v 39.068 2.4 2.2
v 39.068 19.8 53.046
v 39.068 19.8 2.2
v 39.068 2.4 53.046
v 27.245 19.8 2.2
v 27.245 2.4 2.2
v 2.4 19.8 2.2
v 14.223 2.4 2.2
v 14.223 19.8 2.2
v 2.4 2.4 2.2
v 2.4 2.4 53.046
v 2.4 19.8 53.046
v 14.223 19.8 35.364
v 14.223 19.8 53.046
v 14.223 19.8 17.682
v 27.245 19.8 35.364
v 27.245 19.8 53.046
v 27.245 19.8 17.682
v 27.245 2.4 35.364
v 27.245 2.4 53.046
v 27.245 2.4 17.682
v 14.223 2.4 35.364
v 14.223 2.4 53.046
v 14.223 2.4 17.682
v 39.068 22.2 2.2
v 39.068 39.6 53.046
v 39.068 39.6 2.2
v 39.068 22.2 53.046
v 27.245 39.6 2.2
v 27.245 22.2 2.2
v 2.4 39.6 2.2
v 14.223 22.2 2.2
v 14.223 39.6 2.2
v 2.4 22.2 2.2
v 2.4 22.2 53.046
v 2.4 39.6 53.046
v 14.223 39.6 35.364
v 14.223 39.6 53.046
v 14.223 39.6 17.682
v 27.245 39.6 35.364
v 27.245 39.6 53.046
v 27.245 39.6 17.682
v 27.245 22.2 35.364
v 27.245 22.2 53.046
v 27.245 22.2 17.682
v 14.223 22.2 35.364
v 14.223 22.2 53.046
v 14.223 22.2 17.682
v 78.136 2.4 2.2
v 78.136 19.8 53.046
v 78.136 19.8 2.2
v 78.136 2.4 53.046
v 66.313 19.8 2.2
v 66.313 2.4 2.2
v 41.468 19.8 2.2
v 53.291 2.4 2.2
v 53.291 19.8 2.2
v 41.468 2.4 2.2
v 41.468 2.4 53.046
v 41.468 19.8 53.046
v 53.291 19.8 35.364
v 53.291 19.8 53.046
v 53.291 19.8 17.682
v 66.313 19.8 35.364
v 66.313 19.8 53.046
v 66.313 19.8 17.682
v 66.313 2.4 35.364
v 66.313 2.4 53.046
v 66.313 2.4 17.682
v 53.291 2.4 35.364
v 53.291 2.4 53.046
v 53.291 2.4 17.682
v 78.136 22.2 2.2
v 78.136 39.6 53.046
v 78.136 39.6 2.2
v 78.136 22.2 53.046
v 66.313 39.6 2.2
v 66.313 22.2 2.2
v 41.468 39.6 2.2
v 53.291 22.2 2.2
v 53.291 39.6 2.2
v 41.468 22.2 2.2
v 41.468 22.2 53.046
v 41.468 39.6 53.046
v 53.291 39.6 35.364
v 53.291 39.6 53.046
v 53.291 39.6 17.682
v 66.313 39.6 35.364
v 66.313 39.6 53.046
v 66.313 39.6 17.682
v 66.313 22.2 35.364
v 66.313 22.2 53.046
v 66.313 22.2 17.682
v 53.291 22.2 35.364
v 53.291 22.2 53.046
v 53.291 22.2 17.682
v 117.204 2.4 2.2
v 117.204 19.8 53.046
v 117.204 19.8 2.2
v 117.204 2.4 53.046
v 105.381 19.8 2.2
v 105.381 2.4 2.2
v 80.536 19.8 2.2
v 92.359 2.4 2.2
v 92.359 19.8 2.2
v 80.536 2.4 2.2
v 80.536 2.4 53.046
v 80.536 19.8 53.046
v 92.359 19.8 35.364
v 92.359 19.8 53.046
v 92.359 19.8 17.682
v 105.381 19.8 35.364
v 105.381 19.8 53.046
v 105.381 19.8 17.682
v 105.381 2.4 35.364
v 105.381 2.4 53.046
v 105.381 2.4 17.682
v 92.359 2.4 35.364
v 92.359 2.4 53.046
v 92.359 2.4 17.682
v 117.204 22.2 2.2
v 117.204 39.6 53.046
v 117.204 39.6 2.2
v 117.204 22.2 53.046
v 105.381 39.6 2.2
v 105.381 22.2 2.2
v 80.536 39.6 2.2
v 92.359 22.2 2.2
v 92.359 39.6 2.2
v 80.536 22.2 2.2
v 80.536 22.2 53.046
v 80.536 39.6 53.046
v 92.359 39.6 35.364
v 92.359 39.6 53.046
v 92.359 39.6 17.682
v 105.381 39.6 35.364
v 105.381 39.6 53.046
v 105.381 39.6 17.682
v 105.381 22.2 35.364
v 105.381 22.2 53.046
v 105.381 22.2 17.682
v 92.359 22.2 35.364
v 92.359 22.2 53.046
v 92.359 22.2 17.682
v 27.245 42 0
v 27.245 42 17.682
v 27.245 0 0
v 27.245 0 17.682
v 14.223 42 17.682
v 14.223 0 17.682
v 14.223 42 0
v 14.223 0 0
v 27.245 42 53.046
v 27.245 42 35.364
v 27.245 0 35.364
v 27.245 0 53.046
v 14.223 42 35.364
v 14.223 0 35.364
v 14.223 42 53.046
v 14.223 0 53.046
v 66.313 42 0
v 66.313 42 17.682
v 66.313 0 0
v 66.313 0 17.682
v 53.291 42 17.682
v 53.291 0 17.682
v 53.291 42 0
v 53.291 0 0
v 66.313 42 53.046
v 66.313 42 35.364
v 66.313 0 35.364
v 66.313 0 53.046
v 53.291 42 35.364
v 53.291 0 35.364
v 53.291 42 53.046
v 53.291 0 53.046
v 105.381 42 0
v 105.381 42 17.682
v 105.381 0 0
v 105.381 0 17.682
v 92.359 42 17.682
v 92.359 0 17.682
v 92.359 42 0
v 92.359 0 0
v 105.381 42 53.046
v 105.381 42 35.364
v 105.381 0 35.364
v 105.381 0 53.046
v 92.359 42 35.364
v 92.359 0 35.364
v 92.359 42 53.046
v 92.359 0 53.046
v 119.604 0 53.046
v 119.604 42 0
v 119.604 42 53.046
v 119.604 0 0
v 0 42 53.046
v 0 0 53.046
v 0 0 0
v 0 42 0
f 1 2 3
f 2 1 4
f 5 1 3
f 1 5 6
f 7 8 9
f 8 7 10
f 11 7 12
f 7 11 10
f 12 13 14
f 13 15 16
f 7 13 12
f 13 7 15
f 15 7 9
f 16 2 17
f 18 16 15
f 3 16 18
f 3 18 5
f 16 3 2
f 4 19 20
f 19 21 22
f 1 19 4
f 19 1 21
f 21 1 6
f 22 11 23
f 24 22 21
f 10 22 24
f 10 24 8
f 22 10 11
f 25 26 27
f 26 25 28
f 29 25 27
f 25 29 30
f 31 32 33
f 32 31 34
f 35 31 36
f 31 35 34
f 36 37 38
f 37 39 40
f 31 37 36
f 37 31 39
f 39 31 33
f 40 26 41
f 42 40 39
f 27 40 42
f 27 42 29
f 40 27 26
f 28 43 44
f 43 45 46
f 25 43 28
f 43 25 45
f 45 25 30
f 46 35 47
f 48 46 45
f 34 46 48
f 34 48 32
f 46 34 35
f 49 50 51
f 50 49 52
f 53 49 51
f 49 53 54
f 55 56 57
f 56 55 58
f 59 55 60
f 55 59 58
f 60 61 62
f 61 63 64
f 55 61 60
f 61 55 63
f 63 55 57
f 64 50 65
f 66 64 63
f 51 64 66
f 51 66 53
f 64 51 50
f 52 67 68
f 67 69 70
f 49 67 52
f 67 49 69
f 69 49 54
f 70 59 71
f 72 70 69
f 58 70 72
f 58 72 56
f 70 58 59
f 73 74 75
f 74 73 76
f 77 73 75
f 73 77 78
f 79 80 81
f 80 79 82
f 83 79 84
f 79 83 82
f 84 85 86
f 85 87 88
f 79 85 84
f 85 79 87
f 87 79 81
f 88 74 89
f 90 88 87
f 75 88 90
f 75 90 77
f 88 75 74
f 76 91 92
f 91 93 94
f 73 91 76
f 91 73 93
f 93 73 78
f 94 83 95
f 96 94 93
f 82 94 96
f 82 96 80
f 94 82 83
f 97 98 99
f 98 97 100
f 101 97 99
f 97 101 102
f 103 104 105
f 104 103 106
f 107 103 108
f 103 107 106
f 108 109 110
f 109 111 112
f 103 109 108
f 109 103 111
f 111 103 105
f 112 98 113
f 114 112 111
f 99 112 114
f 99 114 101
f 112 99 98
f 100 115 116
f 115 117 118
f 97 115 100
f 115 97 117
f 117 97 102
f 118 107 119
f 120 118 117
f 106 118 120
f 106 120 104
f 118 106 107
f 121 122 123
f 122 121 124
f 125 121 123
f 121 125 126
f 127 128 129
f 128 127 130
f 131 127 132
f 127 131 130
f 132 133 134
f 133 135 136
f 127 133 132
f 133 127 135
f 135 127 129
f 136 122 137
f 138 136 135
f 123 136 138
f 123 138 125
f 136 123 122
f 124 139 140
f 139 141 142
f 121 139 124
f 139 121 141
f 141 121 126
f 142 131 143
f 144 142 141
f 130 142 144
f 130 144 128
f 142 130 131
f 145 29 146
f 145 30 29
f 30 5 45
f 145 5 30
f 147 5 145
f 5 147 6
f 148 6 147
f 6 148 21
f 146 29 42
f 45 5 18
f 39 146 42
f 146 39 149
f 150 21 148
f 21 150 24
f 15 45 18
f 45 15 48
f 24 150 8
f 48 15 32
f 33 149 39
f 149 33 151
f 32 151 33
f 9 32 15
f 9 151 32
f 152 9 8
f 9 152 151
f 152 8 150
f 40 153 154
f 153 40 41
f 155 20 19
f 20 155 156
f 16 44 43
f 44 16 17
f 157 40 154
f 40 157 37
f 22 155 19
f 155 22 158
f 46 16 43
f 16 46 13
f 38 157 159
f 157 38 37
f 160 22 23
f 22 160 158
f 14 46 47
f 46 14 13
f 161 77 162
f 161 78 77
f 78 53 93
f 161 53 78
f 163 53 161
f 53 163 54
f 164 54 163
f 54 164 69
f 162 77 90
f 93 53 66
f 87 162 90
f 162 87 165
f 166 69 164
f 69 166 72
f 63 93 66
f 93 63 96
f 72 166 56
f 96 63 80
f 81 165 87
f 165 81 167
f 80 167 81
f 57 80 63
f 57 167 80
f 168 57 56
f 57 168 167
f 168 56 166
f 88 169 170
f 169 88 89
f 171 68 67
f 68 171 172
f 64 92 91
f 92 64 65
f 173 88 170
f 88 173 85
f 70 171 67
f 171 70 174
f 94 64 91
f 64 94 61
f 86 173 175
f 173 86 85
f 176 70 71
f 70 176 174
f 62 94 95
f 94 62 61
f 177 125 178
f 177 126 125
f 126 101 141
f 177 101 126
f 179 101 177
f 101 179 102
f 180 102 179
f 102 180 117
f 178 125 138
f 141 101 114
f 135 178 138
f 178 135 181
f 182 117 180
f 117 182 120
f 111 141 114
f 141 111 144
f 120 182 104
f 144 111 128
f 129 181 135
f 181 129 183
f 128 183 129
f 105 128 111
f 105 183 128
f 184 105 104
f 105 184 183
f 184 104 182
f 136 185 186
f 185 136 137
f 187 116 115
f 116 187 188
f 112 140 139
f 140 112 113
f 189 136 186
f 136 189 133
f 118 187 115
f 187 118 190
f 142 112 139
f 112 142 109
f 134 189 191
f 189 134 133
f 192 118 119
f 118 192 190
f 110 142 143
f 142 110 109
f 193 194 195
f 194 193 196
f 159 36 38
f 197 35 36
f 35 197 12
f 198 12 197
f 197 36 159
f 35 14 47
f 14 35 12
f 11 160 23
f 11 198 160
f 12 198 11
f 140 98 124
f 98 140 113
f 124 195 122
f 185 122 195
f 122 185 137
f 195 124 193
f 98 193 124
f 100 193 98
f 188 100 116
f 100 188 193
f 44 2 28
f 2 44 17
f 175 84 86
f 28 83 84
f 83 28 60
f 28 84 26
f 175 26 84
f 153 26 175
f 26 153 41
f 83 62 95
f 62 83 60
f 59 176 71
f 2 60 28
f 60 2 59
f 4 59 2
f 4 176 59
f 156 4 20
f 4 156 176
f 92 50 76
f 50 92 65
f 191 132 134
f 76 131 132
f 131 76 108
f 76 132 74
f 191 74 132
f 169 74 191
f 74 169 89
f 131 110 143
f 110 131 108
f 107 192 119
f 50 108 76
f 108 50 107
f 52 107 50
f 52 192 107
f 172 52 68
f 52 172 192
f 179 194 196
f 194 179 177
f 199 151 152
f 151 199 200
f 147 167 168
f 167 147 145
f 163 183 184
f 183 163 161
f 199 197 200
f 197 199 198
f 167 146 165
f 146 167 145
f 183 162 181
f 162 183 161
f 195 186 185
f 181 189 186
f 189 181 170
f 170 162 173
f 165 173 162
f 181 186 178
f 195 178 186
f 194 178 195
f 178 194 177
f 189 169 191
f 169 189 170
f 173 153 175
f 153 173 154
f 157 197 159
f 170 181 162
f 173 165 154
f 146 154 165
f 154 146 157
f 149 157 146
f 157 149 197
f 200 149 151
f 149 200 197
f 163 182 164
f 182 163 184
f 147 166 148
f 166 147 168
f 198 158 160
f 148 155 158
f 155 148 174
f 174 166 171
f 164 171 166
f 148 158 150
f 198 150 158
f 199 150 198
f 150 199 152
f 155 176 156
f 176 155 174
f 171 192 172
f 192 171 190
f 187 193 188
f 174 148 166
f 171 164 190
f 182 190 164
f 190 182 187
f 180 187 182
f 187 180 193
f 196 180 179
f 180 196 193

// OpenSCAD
//Input Parameters


/* [Batteries] */

//Battery width
Sy = 16.8; 

//Battery depth
Sx = 36.068; 

//Battery height
Sz = 50.546; 

//Number of batteries in X direction
Nx = 3; 

//Number of batteries in Y direction
Ny = 2; 


/* [Build] */

//Clearance between batteries and print
C = 0.3; 

//Wall thickness
Tw = 2.4; 

//Bottom thickenness
Tb = 2.2; 




//X dimension of block
Dx = Tw+Nx*(2*C+Sx+Tw);
Dy = Tw+Ny*(2*C+Sy+Tw);
Dz = Sz+Tb+C;

echo(Dx=Dx,Dy=Dy,Dz=Dz);

//Battery Void Dimensions
Vx = Sx+2*C;
Vy = Sy+2*C;
Vz = Sz+C;

echo(Vx=Vx,Vy=Vy,Vz=Vz);


/* [Hidden] */


void_over = 5; //Void Extension



module Block()
{
    cube([Dx,Dy,Dz]);
}


module BatteryVoids()
{
    for(i=[0:Nx-1]){
        for(j=[0:Ny-1]){
            Txi = Tw+i*(Vx+Tw); 
            Tyi = Tw+j*(Vy+Tw);
           
            echo(i=i,j=j,Vx=Vx,Vy=Vy,Vz=Vz,Txi=Txi,Tyi=Tyi);
            
            translate([Txi,Tyi,Tb]){
                cube([Vx,Vy,Vz+void_over]);
            }
        }
    }
}

module NotchVoids()
{
    for(i=[0:Nx-1]){
        
        
        Wx = (Dx-Tw)/Nx/3;
        Wz = Dz/3;
        
        Txi = i*(Vx+Tw)+Tw+Vx/2-Wx/2;
        
        
        
          translate([Txi,-void_over,-void_over]){
                cube([Wx,Dy+2*void_over,Wz+void_over]);
            }   
            
          translate([Txi,-void_over,2*Wz]){
                cube([Wx,Dy+2*void_over,Wz+void_over]);
            }  
    }
}




//BatteryVoids();


difference() {
    Block();
    BatteryVoids();
    NotchVoids();
}
